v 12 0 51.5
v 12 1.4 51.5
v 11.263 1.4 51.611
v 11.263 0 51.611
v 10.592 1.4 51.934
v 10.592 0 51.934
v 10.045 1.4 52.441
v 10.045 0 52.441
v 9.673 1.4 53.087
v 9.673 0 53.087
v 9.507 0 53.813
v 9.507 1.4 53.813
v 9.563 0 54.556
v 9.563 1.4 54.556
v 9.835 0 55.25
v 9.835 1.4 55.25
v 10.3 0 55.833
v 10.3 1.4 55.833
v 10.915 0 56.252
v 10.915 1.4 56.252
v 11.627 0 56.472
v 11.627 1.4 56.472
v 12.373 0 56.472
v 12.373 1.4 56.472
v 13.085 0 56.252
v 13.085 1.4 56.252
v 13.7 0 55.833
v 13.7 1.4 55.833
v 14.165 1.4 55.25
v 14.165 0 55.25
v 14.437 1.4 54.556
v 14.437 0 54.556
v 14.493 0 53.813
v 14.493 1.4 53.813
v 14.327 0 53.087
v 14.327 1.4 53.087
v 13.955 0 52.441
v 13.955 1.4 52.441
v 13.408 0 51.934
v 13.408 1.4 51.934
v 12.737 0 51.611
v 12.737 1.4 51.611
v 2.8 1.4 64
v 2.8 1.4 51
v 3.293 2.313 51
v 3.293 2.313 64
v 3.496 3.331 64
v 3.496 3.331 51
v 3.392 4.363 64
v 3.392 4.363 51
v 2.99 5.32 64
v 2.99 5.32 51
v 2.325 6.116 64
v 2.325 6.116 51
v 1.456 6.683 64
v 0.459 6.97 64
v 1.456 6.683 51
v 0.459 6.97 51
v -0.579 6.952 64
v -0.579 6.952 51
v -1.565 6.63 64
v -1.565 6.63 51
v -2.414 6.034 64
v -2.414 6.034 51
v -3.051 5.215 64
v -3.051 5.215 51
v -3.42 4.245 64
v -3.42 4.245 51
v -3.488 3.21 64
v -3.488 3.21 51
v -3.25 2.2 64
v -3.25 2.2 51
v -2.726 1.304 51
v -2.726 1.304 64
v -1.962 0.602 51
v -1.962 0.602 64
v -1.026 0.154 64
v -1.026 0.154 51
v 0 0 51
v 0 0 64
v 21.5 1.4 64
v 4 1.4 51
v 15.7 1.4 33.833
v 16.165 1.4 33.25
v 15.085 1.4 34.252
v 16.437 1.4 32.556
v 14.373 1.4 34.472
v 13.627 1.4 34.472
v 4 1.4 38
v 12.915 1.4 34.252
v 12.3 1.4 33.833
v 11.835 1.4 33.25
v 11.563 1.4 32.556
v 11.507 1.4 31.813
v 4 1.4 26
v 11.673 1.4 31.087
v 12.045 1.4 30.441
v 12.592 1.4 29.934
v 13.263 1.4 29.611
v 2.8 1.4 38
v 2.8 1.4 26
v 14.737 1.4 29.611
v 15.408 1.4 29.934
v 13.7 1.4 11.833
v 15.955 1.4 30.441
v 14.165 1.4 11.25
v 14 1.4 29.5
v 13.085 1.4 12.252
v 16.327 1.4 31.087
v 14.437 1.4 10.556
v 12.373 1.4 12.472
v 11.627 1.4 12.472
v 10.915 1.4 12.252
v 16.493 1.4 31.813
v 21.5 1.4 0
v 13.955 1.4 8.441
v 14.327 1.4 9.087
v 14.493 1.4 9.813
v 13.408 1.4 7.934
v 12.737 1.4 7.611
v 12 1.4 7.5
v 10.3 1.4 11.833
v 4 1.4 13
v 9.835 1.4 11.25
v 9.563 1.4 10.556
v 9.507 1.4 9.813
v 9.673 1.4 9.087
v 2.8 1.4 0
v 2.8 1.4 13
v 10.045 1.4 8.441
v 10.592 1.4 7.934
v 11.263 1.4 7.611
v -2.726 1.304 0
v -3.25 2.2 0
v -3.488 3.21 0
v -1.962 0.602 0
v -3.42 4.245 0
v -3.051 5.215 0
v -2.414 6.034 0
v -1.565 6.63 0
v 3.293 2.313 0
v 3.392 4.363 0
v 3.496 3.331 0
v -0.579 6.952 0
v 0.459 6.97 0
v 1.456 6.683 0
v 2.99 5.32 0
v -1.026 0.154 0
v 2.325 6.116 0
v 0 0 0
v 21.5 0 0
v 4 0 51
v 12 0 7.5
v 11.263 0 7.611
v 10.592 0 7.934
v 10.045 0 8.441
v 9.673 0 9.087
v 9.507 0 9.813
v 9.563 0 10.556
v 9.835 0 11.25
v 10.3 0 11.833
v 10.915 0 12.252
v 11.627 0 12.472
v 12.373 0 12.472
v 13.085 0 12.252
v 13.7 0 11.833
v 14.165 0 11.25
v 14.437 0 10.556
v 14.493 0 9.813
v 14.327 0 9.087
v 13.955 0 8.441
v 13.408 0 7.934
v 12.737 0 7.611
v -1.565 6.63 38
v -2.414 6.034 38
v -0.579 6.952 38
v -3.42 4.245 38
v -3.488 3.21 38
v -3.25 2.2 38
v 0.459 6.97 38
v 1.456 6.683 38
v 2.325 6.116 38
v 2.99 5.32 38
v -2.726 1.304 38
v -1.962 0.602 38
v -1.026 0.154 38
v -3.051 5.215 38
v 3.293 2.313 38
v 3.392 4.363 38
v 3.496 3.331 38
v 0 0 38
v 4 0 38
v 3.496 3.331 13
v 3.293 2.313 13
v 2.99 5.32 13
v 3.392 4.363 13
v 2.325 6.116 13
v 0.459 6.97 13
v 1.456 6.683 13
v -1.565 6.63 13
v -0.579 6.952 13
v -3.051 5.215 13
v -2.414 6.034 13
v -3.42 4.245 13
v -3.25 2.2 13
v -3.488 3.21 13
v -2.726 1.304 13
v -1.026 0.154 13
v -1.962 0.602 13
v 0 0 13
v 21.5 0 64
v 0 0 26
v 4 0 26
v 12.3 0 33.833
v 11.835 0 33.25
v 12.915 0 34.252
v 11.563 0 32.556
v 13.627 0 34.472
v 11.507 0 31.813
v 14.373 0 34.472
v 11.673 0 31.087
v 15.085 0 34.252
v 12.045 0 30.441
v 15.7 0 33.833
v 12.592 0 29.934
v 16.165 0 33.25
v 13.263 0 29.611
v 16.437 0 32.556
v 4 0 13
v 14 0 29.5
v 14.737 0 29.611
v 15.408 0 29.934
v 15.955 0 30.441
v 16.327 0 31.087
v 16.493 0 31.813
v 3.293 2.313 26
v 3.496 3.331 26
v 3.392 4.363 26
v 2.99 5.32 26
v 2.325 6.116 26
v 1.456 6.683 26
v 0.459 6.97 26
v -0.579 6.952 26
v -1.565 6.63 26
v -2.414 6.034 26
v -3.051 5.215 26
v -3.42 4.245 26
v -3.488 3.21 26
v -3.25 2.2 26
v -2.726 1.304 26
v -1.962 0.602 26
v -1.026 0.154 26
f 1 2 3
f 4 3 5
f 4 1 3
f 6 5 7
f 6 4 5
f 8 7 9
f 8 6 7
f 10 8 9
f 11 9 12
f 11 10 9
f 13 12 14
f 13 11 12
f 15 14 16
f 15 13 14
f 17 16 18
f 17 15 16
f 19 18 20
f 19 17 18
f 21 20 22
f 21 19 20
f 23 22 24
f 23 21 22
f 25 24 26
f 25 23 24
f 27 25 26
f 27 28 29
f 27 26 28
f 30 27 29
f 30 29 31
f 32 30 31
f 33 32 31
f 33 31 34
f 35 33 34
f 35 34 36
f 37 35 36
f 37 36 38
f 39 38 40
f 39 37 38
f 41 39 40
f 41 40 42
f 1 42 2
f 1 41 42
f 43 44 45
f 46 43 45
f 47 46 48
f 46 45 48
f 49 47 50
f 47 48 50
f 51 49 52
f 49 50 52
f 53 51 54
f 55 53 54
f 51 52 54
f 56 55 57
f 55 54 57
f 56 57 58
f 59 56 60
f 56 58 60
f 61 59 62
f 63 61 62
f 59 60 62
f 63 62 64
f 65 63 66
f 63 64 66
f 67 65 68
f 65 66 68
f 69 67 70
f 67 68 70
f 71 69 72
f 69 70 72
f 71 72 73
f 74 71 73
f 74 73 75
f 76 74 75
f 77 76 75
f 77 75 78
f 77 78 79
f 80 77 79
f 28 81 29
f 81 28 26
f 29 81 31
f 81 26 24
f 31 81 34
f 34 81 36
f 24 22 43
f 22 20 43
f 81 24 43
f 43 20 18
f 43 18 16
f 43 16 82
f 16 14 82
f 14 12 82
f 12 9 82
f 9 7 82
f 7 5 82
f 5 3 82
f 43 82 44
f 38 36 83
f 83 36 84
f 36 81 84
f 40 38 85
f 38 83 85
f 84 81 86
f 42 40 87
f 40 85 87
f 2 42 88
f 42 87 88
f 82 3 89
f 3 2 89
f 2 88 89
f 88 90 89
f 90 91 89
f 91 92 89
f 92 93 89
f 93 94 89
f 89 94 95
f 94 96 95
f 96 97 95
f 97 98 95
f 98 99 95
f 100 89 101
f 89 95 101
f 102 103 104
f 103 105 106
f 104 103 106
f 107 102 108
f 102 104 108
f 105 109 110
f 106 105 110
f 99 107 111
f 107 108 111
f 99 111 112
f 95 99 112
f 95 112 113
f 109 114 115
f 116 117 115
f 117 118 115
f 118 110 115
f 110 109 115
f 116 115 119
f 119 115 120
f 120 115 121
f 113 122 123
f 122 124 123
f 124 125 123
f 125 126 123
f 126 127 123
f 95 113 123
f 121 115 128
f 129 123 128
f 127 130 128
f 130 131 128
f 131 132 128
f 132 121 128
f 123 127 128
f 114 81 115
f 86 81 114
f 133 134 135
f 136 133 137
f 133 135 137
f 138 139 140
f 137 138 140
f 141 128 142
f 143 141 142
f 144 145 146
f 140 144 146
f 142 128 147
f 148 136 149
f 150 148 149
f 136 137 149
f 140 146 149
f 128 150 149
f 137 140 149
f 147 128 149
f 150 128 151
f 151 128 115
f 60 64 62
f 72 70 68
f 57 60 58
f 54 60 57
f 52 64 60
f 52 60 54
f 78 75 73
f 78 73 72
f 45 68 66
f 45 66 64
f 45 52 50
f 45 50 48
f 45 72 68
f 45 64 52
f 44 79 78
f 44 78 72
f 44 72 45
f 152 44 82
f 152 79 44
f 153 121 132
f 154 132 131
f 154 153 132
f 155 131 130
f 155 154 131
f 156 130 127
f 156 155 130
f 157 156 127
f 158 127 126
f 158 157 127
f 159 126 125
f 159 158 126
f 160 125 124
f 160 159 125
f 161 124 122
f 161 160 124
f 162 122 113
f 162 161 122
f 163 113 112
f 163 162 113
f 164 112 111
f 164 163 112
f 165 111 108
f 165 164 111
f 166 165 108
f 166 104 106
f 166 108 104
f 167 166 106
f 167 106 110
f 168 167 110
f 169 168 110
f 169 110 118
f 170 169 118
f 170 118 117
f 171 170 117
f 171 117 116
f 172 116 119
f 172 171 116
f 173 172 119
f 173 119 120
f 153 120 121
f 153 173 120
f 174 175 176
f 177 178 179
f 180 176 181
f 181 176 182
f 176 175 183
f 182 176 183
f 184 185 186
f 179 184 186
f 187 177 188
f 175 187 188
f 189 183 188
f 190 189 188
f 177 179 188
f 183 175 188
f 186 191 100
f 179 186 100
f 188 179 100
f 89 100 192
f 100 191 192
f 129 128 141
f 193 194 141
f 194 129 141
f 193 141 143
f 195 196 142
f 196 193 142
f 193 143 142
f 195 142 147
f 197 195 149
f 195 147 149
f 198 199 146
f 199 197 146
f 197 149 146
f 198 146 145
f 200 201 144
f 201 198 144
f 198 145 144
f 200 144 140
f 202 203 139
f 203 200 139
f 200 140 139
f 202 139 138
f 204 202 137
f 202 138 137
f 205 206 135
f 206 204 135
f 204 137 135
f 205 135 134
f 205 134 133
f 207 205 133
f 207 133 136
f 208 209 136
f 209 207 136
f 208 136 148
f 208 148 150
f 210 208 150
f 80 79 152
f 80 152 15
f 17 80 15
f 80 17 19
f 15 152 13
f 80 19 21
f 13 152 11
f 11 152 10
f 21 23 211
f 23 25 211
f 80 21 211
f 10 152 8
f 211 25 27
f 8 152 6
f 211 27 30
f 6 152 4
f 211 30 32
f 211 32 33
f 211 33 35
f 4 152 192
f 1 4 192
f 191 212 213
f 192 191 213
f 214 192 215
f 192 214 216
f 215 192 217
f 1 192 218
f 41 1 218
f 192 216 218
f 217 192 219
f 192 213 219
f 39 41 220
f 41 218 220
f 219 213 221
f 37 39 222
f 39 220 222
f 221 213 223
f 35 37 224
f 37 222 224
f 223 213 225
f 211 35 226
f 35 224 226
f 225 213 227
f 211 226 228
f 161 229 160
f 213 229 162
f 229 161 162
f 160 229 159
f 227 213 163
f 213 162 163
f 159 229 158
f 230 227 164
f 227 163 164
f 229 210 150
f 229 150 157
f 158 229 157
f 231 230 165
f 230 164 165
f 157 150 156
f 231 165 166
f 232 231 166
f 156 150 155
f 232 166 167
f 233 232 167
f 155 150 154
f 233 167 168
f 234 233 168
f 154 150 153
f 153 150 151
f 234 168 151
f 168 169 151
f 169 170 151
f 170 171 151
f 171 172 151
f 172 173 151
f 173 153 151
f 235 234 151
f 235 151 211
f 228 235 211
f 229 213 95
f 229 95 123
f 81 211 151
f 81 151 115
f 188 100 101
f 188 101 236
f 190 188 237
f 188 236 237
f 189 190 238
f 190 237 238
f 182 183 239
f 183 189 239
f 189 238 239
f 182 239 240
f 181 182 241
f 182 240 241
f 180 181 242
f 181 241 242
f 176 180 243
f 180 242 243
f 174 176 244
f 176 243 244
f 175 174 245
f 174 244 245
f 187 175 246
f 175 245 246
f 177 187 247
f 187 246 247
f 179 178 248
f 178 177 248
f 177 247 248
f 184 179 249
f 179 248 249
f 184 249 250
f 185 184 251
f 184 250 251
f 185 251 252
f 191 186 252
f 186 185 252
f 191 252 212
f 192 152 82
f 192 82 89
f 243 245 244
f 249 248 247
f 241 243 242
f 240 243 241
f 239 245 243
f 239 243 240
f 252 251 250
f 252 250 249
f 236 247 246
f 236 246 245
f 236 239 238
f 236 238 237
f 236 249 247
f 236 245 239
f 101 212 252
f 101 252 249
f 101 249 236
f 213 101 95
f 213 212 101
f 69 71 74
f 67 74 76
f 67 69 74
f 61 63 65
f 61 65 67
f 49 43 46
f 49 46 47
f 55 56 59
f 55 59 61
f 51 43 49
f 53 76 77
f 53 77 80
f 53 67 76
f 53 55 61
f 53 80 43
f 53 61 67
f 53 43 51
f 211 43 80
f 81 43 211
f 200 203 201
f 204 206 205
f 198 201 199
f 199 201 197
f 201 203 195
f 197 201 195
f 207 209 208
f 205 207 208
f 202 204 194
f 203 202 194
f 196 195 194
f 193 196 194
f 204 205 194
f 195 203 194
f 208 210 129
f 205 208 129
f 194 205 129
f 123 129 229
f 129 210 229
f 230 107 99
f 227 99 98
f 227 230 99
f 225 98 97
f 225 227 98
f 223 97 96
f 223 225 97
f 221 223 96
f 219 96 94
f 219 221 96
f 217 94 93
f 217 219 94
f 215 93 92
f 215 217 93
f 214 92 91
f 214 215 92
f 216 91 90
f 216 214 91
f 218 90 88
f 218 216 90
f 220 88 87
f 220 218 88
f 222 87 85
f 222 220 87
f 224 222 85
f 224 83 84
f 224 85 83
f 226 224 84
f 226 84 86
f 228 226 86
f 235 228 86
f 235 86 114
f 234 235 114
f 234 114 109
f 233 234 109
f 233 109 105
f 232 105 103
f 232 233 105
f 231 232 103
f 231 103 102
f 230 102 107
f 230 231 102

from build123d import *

# Parameters (mm, degrees)
BOSS_EXTRUDE1_DEPTH = 64
SKETCH2_R           = 2.499999953
CUT_EXTRUDE2_DEPTH  = 5
SKETCH3_W           = 8.000000002
SKETCH3_H           = 13
CUT_EXTRUDE3_DEPTH  = 15


with BuildPart() as part:
    # Sketch1 → Boss-Extrude1 (new body)
    with BuildSketch(Plane.XY):
        with BuildLine():
            Line((0, 0), (21.499999926, 0))
            Line((21.499999926, 0), (21.499999926, 1.4))
            Line((21.499999926, 1.4), (2.799999992, 1.4))
            ThreePointArc((2.799999992, 1.4), (-1.565247581, 6.630495138), (0, 0))
        make_face()
    extrude(amount=BOSS_EXTRUDE1_DEPTH)

    # Sketch2 → Cut-Extrude2 (cut)
    with BuildSketch(Plane(origin=(0, 0, 0), x_dir=(1, 0, 0), z_dir=(0, 1, 0))):
        with Locations(Location((11.999999876, -53.99999995, 0), (0, 0, 90))):
            Circle(SKETCH2_R)
        with Locations(Location((13.999999876, -32.000000008, 0), (0, 0, 90))):
            Circle(SKETCH2_R)
        with Locations(Location((11.999999876, -10.000000066, 0), (0, 0, 90))):
            Circle(SKETCH2_R)
    extrude(amount=CUT_EXTRUDE2_DEPTH, mode=Mode.SUBTRACT)

    # Sketch3 → Cut-Extrude3 (cut)
    with BuildSketch(Plane(origin=(0, 0, 0), x_dir=(1, 0, 0), z_dir=(0, 1, 0))):
        with Locations((1e-09, -19.499999908)):
            Rectangle(SKETCH3_W, SKETCH3_H)
        with Locations((1e-09, -44.499999908)):
            Rectangle(SKETCH3_W, SKETCH3_H)
    extrude(amount=CUT_EXTRUDE3_DEPTH, mode=Mode.SUBTRACT)


solid = part.part
